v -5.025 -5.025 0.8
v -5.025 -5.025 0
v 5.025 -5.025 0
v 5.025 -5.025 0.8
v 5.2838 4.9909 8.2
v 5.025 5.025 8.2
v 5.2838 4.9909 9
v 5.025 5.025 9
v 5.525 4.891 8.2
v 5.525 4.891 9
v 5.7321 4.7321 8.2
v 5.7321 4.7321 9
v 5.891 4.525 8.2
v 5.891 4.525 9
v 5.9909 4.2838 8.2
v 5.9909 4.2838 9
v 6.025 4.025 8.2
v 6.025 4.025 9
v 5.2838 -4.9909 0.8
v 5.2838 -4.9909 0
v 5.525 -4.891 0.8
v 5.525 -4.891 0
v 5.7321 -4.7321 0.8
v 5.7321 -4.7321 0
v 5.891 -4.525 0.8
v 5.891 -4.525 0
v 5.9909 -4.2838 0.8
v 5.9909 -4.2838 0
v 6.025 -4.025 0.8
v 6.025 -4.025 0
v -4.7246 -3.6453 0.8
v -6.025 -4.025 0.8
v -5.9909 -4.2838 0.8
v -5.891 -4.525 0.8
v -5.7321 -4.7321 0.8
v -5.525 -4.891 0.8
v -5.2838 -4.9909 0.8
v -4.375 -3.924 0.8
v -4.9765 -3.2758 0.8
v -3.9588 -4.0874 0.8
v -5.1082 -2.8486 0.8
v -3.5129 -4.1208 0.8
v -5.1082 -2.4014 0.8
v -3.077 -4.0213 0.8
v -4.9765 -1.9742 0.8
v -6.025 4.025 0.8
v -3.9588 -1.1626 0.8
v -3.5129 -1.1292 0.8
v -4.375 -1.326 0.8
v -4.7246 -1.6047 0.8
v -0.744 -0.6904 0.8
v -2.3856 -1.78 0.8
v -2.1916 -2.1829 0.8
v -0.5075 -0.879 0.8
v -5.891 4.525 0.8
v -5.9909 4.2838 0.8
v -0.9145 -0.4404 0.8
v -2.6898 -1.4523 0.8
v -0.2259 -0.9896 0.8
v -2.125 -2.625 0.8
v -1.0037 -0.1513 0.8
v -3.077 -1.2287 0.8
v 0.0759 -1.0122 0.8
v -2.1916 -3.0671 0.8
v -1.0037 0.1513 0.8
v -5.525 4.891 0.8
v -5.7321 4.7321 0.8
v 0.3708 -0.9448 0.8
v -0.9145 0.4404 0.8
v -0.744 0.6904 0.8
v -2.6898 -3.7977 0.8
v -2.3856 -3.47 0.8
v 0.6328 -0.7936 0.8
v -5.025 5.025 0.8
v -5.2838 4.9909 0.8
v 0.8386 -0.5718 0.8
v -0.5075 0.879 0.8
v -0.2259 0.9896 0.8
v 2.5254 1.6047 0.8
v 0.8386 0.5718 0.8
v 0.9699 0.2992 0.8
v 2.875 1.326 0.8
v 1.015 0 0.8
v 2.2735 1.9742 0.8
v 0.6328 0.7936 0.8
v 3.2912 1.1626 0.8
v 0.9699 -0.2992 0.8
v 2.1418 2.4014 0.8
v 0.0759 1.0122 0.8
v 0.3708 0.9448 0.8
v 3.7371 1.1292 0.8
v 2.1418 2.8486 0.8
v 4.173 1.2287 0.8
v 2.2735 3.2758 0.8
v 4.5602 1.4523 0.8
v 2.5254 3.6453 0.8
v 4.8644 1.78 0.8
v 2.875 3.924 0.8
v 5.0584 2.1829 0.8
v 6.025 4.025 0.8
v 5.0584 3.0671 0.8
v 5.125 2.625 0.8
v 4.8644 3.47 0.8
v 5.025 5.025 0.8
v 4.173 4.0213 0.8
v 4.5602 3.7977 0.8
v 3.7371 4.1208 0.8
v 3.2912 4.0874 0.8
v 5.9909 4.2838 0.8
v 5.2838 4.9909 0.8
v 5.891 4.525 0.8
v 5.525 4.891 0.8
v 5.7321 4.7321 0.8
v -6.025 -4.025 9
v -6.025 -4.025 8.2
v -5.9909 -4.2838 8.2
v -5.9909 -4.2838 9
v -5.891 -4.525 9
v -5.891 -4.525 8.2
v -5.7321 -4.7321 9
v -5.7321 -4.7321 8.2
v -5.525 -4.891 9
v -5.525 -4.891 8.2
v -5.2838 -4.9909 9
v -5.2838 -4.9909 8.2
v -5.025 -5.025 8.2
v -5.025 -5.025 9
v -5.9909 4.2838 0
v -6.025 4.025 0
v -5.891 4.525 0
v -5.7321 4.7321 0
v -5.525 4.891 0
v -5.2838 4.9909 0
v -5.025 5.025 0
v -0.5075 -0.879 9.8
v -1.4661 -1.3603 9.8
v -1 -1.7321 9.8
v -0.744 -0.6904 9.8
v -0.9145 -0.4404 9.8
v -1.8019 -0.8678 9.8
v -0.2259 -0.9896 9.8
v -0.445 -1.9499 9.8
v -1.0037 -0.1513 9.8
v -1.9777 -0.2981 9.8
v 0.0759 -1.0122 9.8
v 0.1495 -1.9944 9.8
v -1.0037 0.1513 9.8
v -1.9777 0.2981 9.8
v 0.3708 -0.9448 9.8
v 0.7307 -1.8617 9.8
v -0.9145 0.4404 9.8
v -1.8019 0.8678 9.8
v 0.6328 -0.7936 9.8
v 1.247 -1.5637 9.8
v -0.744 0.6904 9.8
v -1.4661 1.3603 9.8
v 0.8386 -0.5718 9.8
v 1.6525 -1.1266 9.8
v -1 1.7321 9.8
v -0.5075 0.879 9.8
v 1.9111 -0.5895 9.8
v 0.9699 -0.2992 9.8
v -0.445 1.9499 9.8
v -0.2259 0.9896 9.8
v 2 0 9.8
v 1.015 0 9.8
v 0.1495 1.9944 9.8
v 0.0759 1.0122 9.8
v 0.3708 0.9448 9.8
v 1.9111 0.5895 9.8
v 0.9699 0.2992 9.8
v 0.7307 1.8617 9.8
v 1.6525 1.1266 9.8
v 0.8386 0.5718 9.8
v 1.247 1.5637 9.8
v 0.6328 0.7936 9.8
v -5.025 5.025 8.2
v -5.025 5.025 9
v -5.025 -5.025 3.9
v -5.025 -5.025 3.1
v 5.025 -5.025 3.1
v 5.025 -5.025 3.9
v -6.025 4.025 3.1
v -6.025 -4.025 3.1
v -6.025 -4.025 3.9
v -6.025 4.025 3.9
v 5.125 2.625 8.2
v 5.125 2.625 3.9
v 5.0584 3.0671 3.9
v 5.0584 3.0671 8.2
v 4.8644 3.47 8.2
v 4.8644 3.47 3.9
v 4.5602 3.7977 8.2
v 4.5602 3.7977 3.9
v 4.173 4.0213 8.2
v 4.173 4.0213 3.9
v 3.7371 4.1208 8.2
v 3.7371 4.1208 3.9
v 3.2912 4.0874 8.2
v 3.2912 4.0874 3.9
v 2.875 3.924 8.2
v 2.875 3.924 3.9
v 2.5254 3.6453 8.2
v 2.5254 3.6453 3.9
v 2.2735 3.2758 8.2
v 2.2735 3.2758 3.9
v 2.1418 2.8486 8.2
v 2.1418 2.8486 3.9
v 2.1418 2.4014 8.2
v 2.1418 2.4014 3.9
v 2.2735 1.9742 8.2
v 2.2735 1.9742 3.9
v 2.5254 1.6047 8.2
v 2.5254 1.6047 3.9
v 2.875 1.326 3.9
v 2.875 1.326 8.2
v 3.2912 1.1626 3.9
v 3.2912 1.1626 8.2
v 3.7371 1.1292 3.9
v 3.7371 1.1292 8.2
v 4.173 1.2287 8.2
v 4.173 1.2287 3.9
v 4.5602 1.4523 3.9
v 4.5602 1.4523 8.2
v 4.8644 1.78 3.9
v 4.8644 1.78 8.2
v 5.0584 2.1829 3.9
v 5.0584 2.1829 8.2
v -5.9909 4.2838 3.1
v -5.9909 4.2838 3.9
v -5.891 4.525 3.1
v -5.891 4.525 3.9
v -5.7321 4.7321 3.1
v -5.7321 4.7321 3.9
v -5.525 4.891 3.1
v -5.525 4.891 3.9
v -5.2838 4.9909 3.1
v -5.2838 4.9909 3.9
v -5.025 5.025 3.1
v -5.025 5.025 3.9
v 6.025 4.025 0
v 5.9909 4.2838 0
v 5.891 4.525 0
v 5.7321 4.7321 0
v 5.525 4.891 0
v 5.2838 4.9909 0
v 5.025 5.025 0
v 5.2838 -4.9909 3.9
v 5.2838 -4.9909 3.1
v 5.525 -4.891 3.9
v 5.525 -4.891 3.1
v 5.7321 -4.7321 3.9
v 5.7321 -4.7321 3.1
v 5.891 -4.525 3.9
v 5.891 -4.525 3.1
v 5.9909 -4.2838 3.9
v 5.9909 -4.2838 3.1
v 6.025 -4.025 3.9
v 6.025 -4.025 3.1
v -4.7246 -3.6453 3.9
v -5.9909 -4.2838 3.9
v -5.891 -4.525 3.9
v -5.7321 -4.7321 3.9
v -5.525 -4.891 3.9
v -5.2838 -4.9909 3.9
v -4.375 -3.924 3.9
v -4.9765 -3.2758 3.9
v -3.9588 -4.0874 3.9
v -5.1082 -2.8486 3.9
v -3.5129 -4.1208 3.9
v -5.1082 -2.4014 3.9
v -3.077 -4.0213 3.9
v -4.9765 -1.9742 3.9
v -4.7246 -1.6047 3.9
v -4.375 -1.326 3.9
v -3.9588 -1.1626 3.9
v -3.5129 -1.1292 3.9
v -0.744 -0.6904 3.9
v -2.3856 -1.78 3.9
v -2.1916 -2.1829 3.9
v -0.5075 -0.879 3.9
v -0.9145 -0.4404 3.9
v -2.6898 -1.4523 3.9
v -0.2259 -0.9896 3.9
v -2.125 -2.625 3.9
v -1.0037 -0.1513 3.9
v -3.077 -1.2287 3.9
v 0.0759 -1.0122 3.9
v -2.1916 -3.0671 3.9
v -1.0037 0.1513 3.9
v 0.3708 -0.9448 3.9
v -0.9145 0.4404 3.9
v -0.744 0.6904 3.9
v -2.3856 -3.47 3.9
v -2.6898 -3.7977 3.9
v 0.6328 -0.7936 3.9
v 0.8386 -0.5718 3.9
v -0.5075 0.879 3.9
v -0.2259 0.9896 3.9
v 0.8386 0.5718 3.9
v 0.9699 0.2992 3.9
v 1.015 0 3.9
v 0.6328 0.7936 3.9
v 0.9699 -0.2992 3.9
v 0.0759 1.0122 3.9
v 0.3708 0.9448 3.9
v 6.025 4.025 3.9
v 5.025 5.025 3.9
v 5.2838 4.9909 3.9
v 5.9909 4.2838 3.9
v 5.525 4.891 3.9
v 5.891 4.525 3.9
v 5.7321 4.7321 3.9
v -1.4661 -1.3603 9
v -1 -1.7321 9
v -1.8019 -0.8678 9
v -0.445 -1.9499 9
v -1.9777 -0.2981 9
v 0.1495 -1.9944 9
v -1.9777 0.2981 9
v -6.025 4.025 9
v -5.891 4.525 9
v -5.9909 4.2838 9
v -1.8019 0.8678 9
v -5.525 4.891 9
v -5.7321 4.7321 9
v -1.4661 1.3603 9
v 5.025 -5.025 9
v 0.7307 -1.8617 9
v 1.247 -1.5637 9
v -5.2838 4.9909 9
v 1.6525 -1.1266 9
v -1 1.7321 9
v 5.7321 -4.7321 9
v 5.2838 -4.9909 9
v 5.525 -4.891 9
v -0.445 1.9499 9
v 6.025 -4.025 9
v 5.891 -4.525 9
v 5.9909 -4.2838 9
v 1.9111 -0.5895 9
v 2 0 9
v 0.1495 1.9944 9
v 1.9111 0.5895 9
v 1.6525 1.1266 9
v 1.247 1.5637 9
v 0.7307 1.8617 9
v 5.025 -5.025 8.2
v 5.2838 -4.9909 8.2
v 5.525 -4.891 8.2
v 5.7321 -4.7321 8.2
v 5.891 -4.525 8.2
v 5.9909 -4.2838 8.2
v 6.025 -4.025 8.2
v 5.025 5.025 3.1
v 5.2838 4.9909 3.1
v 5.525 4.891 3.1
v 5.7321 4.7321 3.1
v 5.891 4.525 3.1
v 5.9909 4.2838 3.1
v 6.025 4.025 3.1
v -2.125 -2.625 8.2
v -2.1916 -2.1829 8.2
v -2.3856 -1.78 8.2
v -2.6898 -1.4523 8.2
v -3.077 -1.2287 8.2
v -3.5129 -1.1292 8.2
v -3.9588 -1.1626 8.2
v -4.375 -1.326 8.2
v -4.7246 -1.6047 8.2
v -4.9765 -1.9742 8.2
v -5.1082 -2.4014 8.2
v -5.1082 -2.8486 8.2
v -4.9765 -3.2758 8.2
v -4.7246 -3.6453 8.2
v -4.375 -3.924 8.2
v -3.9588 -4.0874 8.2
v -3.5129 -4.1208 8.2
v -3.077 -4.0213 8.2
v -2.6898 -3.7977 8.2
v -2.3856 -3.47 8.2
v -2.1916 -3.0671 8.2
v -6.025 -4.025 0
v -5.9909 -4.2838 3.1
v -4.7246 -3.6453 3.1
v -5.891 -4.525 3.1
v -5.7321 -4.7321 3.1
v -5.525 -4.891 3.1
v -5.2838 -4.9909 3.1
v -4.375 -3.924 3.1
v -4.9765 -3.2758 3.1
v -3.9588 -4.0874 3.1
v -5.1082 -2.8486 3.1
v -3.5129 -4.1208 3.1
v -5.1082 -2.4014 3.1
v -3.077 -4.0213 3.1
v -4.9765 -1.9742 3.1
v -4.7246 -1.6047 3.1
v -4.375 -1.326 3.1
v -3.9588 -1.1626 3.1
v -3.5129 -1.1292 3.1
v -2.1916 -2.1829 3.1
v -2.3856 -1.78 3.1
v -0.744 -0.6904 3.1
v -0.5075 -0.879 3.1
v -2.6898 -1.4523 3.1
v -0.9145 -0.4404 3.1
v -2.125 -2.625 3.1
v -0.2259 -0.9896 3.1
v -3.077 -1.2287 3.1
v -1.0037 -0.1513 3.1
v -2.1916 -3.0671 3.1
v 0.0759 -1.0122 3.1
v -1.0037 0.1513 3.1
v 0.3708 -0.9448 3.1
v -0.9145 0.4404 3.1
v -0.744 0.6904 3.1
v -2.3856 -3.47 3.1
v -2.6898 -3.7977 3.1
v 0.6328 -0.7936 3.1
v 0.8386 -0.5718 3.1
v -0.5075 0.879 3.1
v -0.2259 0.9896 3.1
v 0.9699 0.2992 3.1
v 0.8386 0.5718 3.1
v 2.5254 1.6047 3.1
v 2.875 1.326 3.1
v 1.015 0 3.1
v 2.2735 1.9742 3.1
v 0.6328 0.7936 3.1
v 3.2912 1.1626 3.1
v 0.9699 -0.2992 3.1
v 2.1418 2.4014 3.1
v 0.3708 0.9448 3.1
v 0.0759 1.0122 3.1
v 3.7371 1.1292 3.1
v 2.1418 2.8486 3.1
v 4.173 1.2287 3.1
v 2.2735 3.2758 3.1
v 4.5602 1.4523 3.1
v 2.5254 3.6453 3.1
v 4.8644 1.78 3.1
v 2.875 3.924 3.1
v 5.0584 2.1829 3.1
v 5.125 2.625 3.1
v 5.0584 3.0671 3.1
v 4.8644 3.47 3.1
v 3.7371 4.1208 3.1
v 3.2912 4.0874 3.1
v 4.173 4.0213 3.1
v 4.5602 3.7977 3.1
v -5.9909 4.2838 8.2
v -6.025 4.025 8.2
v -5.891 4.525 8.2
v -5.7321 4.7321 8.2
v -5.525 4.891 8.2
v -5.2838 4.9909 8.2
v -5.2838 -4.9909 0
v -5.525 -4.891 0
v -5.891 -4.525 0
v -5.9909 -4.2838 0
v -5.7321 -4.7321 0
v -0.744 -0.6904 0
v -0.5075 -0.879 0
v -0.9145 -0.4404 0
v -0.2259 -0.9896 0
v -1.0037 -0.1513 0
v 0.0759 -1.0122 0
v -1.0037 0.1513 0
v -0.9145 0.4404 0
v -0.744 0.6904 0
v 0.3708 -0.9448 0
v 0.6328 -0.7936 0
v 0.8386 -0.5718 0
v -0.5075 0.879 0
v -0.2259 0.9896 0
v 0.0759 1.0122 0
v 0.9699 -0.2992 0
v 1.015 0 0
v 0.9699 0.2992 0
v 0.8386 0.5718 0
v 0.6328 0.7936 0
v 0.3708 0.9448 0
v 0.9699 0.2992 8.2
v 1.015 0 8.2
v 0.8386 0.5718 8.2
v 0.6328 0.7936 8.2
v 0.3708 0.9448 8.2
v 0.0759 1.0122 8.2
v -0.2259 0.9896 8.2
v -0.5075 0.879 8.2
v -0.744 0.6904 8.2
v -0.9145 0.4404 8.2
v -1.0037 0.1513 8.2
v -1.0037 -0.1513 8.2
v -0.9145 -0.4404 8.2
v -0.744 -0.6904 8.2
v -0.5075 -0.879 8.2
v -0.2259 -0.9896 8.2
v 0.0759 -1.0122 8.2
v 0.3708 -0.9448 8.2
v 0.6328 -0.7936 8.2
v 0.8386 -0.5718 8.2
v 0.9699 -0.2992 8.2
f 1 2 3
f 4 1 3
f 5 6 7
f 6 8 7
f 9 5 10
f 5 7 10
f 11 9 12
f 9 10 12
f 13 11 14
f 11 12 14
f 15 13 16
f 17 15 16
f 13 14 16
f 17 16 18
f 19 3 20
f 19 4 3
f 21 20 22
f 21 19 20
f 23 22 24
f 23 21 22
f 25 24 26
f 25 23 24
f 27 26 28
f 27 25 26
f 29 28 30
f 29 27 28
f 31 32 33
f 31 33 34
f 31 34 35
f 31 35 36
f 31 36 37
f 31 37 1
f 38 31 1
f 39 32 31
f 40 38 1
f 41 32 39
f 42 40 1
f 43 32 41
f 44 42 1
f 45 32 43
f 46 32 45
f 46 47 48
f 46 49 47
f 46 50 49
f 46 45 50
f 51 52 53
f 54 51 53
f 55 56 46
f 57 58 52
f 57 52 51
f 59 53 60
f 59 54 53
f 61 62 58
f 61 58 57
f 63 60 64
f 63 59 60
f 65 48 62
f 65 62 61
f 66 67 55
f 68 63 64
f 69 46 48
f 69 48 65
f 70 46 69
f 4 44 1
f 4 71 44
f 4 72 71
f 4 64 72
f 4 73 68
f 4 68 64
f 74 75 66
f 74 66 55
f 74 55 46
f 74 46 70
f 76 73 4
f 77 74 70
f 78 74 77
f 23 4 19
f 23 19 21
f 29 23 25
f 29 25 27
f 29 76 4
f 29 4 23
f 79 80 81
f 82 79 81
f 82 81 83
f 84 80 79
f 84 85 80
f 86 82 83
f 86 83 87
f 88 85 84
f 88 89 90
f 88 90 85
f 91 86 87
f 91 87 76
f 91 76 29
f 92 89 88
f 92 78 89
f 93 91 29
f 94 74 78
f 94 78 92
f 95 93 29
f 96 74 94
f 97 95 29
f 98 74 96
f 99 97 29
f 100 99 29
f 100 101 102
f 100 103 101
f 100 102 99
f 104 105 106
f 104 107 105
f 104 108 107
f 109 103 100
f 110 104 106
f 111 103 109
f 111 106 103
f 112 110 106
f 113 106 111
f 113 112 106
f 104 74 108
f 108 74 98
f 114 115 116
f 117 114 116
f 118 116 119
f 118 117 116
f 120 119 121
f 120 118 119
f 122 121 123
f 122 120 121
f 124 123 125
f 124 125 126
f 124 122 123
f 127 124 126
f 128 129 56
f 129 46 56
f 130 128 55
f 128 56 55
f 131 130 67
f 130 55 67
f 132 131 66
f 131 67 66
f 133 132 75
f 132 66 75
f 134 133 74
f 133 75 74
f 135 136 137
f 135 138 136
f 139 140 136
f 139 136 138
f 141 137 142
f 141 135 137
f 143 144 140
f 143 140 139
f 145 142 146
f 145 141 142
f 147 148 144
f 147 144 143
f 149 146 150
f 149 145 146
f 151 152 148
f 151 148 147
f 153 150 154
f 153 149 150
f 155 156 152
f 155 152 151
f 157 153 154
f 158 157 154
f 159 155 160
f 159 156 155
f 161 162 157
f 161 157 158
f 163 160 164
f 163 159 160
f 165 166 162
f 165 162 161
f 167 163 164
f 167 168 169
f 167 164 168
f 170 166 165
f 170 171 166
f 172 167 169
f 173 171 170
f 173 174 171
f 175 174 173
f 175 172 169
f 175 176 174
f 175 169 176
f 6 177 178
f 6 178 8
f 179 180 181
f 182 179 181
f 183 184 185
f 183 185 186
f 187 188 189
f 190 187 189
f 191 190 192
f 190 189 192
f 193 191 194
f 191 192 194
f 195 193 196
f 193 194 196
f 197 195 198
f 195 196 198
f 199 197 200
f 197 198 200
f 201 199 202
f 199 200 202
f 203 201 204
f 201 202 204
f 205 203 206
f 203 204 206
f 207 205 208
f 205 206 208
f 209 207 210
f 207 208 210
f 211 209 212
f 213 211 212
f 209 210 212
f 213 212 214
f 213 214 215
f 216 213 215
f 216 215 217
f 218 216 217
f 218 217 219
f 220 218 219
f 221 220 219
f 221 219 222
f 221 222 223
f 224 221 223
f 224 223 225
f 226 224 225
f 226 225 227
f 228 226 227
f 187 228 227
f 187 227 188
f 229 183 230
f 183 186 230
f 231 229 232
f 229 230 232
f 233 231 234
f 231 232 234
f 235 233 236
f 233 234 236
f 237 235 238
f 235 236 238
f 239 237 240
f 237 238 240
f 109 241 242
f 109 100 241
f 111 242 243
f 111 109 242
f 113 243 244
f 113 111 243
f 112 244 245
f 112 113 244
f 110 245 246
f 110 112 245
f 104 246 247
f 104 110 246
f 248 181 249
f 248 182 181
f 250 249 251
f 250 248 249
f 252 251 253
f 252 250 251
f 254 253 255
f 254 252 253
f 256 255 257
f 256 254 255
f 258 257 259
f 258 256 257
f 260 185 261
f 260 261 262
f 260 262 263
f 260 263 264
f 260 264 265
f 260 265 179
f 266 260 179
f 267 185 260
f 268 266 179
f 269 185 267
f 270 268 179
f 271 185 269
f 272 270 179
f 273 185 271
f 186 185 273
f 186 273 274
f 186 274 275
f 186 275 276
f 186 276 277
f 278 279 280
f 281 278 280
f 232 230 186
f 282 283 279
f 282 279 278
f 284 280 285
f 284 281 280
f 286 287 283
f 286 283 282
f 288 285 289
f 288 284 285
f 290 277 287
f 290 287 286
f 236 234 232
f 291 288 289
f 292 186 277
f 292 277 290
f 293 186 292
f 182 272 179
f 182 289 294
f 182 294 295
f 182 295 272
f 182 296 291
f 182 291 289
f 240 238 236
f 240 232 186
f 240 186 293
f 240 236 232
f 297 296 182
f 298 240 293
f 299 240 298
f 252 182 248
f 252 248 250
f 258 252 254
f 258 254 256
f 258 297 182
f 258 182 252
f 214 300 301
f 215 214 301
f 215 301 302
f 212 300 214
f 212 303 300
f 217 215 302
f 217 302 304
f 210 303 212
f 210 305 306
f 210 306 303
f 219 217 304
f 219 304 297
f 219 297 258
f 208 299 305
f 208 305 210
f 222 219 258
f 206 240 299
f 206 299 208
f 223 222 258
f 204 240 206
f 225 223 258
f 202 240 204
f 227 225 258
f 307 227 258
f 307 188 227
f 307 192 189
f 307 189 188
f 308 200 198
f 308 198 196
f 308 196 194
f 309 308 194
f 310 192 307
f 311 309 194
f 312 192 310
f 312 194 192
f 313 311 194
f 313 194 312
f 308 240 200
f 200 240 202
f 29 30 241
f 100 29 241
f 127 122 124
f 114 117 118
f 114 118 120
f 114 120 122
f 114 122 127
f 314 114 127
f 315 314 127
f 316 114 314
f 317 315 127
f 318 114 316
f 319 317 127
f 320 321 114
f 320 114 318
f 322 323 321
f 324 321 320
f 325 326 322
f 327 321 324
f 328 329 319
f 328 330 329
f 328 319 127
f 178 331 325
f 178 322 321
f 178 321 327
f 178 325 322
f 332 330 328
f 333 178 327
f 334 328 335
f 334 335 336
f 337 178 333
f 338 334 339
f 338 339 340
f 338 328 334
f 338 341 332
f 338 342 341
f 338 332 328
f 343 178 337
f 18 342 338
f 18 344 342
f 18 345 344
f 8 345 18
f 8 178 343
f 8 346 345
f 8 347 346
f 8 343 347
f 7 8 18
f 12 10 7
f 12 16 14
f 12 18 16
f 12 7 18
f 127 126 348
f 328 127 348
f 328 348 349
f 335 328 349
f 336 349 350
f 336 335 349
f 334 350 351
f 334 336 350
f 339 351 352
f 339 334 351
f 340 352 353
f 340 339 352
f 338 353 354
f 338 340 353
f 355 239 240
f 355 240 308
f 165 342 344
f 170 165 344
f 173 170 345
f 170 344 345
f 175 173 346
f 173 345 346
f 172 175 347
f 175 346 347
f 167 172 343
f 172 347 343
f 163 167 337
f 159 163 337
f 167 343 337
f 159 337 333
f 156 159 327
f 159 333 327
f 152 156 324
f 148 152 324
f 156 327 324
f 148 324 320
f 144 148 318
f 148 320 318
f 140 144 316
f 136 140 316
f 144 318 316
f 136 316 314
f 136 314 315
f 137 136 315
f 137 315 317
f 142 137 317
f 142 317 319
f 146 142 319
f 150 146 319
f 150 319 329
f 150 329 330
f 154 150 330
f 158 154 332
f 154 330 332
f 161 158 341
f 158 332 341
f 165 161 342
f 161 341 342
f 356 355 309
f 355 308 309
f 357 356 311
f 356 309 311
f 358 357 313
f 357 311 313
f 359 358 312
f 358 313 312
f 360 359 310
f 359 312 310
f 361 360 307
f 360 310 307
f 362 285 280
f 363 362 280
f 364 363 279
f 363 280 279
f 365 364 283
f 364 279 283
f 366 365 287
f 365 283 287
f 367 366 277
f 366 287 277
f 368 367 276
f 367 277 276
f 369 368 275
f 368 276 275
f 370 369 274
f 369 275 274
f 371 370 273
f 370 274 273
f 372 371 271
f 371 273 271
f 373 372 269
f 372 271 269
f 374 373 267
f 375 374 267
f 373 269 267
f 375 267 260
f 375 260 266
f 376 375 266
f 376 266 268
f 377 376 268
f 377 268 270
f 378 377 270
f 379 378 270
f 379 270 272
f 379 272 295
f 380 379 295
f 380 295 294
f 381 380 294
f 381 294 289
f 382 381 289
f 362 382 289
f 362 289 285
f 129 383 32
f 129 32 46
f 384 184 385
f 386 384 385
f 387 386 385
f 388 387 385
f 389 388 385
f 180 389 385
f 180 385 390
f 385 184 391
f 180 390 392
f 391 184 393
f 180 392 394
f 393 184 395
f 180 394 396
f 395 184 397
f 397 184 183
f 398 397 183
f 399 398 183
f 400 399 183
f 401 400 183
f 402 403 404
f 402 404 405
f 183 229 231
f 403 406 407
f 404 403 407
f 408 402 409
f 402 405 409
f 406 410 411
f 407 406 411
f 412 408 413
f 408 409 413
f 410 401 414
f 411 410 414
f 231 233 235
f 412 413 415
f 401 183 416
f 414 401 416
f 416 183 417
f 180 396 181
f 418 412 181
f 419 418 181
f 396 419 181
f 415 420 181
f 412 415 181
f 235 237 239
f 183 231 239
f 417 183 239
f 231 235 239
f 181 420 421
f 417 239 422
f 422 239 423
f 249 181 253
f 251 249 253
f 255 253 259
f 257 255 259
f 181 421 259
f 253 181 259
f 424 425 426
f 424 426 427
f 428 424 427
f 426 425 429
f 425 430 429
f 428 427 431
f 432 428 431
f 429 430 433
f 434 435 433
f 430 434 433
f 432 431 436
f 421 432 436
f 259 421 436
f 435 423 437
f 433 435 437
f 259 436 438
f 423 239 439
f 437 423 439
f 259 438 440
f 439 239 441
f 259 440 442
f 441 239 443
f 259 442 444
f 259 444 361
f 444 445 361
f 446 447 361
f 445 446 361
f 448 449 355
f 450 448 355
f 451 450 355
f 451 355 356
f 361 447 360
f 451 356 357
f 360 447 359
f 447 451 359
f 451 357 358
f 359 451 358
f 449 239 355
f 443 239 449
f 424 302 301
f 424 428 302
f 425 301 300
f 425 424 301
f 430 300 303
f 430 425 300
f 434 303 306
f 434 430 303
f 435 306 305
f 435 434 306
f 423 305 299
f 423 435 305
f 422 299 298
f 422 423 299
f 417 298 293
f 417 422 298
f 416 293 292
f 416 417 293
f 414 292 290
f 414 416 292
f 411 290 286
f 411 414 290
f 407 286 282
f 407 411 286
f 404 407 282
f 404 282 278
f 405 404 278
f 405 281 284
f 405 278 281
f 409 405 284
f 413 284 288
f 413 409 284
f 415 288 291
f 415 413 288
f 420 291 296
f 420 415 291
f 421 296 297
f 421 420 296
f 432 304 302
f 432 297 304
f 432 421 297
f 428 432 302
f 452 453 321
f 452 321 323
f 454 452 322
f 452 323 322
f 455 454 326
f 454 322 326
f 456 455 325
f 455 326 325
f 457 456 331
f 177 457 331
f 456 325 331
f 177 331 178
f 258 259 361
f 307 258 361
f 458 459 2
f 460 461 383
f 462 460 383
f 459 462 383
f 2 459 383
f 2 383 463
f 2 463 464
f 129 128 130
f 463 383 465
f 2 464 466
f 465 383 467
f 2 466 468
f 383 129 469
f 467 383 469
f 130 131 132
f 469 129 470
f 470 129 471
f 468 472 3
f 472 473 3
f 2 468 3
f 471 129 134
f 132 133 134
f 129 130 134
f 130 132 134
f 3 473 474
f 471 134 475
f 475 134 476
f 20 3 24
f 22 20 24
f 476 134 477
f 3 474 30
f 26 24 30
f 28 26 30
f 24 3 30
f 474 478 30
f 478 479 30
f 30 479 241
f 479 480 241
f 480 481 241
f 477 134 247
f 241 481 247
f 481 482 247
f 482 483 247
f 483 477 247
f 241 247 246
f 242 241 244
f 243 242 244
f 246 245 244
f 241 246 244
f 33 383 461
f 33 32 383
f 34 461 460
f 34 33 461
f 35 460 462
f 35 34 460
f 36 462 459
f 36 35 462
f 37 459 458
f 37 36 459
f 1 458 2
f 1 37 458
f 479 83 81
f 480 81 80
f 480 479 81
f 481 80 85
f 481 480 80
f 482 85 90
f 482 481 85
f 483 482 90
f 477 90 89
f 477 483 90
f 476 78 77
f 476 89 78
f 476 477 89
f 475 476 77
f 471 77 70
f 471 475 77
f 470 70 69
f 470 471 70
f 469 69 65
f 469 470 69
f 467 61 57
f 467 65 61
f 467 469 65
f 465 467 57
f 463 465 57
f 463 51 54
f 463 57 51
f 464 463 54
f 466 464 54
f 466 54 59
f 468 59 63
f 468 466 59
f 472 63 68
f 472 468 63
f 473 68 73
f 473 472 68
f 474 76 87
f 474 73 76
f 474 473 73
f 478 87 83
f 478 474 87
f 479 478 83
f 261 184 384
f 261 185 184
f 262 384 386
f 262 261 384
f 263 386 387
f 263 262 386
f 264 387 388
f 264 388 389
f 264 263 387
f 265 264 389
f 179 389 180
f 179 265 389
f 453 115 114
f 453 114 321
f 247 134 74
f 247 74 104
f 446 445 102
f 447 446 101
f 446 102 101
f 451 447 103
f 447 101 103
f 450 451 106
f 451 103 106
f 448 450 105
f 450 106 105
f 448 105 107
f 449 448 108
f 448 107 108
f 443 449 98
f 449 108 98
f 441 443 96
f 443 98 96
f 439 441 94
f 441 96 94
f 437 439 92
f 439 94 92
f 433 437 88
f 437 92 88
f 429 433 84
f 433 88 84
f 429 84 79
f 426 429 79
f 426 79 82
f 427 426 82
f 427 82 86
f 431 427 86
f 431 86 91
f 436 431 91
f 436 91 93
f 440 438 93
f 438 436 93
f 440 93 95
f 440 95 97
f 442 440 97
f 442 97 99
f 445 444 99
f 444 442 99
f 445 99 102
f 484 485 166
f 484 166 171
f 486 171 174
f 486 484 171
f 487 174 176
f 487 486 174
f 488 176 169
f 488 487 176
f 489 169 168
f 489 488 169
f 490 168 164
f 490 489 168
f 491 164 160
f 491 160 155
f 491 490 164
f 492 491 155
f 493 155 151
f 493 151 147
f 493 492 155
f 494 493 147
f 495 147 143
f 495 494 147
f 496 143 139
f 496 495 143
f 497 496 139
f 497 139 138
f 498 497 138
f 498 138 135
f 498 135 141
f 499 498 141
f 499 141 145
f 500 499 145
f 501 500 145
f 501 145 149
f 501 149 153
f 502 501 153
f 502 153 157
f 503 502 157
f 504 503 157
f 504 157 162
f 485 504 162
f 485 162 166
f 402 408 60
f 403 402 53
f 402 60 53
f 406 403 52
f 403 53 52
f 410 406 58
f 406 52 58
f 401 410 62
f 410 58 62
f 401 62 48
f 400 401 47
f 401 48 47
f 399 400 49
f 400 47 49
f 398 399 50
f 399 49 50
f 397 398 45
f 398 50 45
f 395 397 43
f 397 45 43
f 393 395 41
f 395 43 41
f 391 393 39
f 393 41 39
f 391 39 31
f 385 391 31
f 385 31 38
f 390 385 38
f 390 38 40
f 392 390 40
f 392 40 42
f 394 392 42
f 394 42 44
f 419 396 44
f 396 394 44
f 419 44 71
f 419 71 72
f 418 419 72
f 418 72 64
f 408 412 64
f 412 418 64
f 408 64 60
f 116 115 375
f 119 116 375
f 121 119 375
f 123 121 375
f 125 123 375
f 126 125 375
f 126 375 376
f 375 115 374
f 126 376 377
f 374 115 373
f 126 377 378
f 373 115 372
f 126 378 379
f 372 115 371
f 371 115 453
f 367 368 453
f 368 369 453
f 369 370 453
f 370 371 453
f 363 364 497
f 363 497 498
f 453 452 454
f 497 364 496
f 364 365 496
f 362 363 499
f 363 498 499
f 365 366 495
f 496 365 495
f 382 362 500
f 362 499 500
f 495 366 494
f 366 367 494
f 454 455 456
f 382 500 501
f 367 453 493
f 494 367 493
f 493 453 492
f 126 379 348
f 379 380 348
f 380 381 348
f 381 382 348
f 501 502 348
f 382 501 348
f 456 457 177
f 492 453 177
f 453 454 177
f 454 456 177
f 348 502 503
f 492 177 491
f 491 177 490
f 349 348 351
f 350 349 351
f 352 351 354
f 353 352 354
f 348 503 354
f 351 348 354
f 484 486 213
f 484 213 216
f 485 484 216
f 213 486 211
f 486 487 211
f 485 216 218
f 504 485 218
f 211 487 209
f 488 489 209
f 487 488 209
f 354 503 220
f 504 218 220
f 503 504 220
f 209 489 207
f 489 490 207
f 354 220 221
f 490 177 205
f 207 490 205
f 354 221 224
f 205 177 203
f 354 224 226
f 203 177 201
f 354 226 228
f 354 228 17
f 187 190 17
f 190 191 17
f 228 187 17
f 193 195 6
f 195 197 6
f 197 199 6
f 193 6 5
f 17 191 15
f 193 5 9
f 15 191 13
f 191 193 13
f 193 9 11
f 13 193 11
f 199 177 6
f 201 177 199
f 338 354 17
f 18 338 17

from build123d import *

# Parameters (mm, degrees)
SKICA5_W                 = 12.05
SKICA5_H                 = 10.05
P_IDAT_VYSUNUT_M5_DEPTH  = 0.8
ZAOBLIT2_R               = 1
SKICA6_R                 = 1.5
P_IDAT_VYSUNUT_M6_DEPTH  = 7.4
LINPOLE1_COUNT           = 2
LINPOLE1_PITCH           = 3.1
ZAOBLIT2_OF_LINPOLE1_R   = 1
LINPOLE2_COUNT           = 2
LINPOLE2_PITCH           = 8.2
ZAOBLIT2_OF_LINPOLE2_R   = 1
SKICA7_R                 = 2
SKICA7_R_2               = 1.015
P_IDAT_VYSUNUT_M7_DEPTH  = 0.8
SKICA9_R                 = 1.015
ODEBRAT_VYSUNUT_M2_DEPTH = 10.8


with BuildPart() as part:
    # Skica5 → Přidat vysunutím5 (new body)
    with BuildSketch(Plane.XY):
        Rectangle(SKICA5_W, SKICA5_H)
    p_idat_vysunut_m5 = extrude(amount=P_IDAT_VYSUNUT_M5_DEPTH)

    # Zaoblit2
    zaoblit2_edges = [part.edges().sort_by_distance(p)[0] for p in [
        (6.025, -5.025, 0.4),
        (-6.025, -5.025, 0.4),
        (-6.025, 5.025, 0.4),
        (6.025, 5.025, 0.4),
    ]]
    fillet(zaoblit2_edges, radius=ZAOBLIT2_R)

    # Skica6 → Přidat vysunutím6 (add)
    with BuildSketch(Plane.XY.offset(0.8)):
        with Locations((3.625, 2.625)):
            Circle(SKICA6_R)
        with Locations((-3.625, -2.625)):
            Circle(SKICA6_R)
    extrude(amount=P_IDAT_VYSUNUT_M6_DEPTH)

    # LinPole1: Přidat vysunutím5 ×2
    with Locations(*[(0, 0, i * LINPOLE1_PITCH) for i in range(1, LINPOLE1_COUNT)]):
        add(p_idat_vysunut_m5)

    # Zaoblit2 of LinPole1
    zaoblit2_of_linpole1_edges = [part.edges().sort_by_distance(p)[0] for p in [
        (6.025, -5.025, 3.5),
        (-6.025, -5.025, 3.5),
        (-6.025, 5.025, 3.5),
        (6.025, 5.025, 3.5),
    ]]
    fillet(zaoblit2_of_linpole1_edges, radius=ZAOBLIT2_OF_LINPOLE1_R)

    # LinPole2: Přidat vysunutím5 ×2
    with Locations(*[(0, 0, i * LINPOLE2_PITCH) for i in range(1, LINPOLE2_COUNT)]):
        add(p_idat_vysunut_m5)

    # Zaoblit2 of LinPole2
    zaoblit2_of_linpole2_edges = [part.edges().sort_by_distance(p)[0] for p in [
        (6.025, -5.025, 8.6),
        (-6.025, -5.025, 8.6),
        (-6.025, 5.025, 8.6),
        (6.025, 5.025, 8.6),
    ]]
    fillet(zaoblit2_of_linpole2_edges, radius=ZAOBLIT2_OF_LINPOLE2_R)

    # Skica7 → Přidat vysunutím7 (add)
    with BuildSketch(Plane.XY.offset(9)):
        Circle(SKICA7_R)
        Circle(SKICA7_R_2, mode=Mode.SUBTRACT)
    extrude(amount=P_IDAT_VYSUNUT_M7_DEPTH)

    # Skica9 → Odebrat vysunutím2 (cut, through all)
    with BuildSketch(Plane.XY):
        Circle(SKICA9_R)
    extrude(amount=ODEBRAT_VYSUNUT_M2_DEPTH, mode=Mode.SUBTRACT)


solid = part.part
